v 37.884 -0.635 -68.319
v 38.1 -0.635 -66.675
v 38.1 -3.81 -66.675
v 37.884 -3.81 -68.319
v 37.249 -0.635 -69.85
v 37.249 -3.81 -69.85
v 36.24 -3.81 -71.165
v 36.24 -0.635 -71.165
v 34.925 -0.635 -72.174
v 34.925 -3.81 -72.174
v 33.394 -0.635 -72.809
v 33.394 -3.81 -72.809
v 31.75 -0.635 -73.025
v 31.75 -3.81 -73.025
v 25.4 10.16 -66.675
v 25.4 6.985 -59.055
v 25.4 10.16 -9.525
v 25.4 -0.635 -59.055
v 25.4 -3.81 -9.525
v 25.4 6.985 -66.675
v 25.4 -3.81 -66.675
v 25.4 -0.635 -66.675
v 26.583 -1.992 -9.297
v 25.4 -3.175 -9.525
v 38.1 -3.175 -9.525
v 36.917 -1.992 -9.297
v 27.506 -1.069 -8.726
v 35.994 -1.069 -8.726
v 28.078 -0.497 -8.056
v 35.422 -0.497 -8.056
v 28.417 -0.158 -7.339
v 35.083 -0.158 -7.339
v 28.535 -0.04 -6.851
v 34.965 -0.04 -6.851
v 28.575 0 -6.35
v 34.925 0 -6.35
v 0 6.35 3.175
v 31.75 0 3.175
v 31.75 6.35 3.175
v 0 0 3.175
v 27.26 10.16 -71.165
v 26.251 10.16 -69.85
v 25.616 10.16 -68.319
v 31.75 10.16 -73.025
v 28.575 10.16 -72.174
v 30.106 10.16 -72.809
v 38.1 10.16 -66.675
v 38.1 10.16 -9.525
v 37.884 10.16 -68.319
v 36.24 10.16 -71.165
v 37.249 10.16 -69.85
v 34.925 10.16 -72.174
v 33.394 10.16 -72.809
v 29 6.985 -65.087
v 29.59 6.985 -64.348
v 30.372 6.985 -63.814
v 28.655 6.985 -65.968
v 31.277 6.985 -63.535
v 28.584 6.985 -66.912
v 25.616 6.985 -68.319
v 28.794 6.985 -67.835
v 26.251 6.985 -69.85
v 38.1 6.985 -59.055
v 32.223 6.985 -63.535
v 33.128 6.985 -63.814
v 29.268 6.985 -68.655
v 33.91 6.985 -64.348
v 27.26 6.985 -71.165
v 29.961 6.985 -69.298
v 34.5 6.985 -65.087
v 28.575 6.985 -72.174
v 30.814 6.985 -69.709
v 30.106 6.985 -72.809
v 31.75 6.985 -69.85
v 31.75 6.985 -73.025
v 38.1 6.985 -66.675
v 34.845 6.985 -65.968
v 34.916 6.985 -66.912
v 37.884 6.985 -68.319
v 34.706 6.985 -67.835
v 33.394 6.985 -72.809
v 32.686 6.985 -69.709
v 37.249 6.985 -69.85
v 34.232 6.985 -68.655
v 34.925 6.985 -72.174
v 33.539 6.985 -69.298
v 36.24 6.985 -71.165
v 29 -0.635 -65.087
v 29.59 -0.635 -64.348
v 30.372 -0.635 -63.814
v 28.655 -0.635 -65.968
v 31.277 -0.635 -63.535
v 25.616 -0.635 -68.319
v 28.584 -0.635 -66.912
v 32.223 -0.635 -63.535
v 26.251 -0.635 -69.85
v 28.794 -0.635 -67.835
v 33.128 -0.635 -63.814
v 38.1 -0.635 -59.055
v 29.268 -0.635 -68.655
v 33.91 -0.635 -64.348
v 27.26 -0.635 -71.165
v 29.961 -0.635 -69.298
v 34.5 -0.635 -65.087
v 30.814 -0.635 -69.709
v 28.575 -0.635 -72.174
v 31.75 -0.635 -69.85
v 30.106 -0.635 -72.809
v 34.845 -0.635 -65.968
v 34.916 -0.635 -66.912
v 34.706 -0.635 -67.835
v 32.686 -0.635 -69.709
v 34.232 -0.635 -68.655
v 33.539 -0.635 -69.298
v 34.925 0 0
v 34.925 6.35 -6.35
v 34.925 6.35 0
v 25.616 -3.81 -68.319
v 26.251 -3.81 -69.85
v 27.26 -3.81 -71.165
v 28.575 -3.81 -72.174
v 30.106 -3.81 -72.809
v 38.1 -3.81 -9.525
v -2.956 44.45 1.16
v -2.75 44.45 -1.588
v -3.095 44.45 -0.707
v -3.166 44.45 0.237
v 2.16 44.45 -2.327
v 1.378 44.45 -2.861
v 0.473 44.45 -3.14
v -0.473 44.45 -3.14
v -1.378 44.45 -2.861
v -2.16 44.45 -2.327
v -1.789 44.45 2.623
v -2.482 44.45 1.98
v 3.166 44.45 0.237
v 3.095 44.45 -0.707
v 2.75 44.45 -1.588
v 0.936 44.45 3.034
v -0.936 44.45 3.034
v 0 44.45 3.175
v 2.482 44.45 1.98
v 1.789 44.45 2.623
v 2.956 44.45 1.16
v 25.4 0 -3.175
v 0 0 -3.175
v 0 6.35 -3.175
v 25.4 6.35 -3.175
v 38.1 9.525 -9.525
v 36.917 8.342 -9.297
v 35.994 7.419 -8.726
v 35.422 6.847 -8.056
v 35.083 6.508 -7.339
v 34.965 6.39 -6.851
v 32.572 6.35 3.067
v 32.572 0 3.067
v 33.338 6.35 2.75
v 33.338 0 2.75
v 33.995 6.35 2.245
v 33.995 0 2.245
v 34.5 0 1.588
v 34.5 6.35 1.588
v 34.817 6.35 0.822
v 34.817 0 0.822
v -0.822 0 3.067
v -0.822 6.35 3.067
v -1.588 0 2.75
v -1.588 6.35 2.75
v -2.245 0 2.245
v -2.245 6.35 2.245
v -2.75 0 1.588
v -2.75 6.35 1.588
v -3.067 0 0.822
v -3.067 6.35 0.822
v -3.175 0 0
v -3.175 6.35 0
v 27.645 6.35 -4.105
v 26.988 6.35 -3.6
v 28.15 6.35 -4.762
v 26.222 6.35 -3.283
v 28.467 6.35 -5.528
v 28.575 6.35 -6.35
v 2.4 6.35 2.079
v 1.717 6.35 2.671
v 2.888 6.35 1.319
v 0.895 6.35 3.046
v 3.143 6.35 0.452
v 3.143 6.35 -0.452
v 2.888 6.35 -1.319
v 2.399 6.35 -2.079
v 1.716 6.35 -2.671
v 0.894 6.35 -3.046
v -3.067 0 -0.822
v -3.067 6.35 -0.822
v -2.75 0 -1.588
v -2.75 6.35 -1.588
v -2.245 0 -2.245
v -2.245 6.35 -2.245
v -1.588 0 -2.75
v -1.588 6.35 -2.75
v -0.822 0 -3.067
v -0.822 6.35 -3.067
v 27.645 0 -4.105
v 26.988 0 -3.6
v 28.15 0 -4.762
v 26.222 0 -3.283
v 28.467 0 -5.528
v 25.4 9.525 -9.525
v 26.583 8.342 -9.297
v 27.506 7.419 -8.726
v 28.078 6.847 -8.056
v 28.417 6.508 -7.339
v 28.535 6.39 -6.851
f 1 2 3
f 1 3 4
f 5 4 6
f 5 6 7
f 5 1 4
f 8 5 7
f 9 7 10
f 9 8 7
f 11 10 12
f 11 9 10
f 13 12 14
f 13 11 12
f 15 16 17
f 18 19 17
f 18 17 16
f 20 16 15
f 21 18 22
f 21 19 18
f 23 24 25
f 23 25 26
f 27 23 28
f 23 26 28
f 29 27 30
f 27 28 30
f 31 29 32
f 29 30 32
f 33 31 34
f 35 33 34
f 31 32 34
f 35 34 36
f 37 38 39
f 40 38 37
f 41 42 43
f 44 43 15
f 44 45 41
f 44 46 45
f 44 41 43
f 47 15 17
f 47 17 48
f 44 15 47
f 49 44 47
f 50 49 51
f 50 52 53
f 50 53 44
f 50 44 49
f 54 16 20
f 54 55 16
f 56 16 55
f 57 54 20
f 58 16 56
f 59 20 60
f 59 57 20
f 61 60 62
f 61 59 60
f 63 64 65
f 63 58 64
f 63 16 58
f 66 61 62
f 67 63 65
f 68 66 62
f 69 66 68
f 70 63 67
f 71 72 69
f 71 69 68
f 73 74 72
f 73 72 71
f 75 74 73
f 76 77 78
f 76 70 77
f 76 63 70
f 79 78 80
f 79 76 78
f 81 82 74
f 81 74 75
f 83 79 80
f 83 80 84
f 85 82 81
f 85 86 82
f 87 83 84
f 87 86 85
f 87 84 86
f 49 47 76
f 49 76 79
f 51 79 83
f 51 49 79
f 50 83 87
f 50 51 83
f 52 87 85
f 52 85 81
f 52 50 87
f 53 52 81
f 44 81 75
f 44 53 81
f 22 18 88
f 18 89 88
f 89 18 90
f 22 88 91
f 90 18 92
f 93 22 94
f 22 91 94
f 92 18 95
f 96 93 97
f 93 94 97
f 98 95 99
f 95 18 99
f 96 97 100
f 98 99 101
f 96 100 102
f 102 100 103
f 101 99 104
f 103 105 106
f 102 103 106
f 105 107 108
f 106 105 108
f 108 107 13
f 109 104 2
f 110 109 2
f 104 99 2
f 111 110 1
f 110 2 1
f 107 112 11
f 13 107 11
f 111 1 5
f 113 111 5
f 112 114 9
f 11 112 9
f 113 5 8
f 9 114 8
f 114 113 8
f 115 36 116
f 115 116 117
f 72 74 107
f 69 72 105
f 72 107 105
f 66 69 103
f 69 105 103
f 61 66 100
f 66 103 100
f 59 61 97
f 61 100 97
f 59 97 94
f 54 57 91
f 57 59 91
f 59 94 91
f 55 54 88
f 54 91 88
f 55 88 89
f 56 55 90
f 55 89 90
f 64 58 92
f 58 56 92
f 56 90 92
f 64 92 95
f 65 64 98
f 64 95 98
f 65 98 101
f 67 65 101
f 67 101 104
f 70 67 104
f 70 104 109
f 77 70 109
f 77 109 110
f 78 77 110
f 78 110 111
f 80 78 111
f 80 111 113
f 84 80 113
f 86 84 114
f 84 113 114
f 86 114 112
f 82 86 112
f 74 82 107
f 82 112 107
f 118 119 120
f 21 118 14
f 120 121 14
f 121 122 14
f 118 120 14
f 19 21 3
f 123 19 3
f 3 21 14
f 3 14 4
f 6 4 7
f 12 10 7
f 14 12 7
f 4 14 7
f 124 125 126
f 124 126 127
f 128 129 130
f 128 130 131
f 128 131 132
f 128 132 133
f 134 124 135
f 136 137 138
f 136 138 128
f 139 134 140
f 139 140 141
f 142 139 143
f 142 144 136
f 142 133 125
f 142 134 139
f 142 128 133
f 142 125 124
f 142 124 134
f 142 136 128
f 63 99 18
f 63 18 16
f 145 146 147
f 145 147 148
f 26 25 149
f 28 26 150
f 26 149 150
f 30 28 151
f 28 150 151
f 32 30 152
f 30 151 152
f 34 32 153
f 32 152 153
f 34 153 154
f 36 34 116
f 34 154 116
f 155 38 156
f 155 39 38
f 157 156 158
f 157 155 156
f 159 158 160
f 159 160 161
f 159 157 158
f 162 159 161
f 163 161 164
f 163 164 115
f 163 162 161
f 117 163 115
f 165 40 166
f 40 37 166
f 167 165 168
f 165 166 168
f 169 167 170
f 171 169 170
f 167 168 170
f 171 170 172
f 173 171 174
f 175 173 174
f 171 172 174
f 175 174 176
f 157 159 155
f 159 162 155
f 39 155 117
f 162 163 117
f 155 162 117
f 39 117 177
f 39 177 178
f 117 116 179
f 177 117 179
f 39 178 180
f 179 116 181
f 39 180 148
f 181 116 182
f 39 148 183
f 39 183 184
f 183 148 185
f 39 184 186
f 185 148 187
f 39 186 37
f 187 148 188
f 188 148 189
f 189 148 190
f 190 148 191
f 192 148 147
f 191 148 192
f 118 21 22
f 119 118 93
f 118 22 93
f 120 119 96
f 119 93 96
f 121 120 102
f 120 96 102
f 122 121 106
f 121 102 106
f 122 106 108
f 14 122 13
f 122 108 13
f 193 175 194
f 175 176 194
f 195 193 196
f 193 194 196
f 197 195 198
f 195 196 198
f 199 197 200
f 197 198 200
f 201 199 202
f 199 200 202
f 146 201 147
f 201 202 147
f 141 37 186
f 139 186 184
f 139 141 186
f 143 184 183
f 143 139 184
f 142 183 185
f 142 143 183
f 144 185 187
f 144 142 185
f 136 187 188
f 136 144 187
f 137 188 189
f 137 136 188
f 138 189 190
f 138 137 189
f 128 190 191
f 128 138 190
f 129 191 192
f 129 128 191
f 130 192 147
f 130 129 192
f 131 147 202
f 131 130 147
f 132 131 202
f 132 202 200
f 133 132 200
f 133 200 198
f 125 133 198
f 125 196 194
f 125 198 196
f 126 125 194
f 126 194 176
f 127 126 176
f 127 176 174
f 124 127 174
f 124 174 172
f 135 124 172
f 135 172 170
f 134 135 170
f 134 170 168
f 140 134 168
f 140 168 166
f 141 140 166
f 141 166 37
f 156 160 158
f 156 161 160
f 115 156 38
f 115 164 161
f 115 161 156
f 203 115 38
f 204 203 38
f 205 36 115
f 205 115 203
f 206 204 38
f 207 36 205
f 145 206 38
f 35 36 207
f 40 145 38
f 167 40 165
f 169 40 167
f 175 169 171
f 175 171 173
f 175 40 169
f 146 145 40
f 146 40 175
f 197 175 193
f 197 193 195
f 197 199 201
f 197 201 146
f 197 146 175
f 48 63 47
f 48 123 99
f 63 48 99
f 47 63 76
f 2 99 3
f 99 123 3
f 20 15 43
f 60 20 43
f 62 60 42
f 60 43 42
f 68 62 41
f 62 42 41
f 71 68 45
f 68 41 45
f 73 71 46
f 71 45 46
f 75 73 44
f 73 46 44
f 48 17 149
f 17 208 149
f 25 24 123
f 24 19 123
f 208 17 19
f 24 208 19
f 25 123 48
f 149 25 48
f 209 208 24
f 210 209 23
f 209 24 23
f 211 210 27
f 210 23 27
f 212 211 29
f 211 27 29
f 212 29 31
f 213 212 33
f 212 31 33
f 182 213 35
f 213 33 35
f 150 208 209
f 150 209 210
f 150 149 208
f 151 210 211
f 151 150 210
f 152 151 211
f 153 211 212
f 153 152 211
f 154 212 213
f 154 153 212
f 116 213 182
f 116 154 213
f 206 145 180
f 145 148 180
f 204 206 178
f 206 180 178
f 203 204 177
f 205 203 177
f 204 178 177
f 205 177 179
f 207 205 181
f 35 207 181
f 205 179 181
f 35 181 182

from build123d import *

# Parameters (mm, degrees)
SKETCH1_R                = 3.175
BOSS_EXTRUDE1_DEPTH      = 38.1
BOSS_EXTRUDE2_DEPTH      = 6.35
FILLET1_R                = 3.175
BOSS_EXTRUDE3_DEPTH      = 3.81
BOSS_EXTRUDE3_DEPTH_BACK = 10.16
SKETCH3_W                = 12.7
SKETCH3_H                = 63.5
FILLET2_R                = 3.175
FILLET3_R                = 6.35
CUT_EXTRUDE1_REACH       = 94.13
SKETCH4_W                = 15.24
SKETCH4_H                = 7.62
SKETCH5_R                = 3.175
BOSS_EXTRUDE4_DEPTH      = 10.16
BOSS_EXTRUDE5_START      = 38.1
SKETCH6_R                = 3.175
BOSS_EXTRUDE5_DEPTH      = 38.1
SKETCH7_R                = 3.175
CUT_EXTRUDE2_DEPTH       = 38.1


with BuildPart() as part:
    # Sketch1 → Boss-Extrude1 (new body)
    with BuildSketch(Plane(origin=(0, 0, 0), x_dir=(1, 0, 0), z_dir=(0, 1, 0))):
        with Locations(Location((0, 0, 0), (0, 0, 270))):
            Circle(SKETCH1_R)
    extrude(amount=-BOSS_EXTRUDE1_DEPTH)

    # Sketch2 → Boss-Extrude2 (add)
    with BuildSketch(Plane(origin=(0, 0, 0), x_dir=(1, 0, 0), z_dir=(0, 1, 0))):
        Polygon((34.925, -3.175), (-3.175, -3.175), (-3.175, 3.175), (28.575, 3.175), (28.575, 60.325), (34.925, 60.325), align=None)
    extrude(amount=BOSS_EXTRUDE2_DEPTH)

    # Fillet1
    fillet1_edges = [part.edges().sort_by_distance(p)[0] for p in [
        (28.575, 3.175, -3.175),
        (34.925, 3.175, 3.175),
        (-3.175, 3.175, -3.175),
        (-3.175, 3.175, 3.175),
    ]]
    fillet(fillet1_edges, radius=FILLET1_R - 0.0001)  # a hair under: the kernel refuses the full size

    # Sketch3 → Boss-Extrude3 (add, two sides: drawn at the far end of the back side and taken through both)
    with BuildSketch(Plane(origin=(0, 6.35, 0), x_dir=(1, 0, 0), z_dir=(0, 1, 0)).offset(-BOSS_EXTRUDE3_DEPTH_BACK)):
        with Locations((31.75, 41.275)):
            Rectangle(SKETCH3_W, SKETCH3_H)
    extrude(amount=BOSS_EXTRUDE3_DEPTH + BOSS_EXTRUDE3_DEPTH_BACK)

    # Fillet2
    fillet2_edges = [part.edges().sort_by_distance(p)[0] for p in [
        (28.575, 3.175, -9.525),
        (31.75, 0, -9.525),
        (34.925, 3.175, -9.525),
        (31.75, 6.35, -9.525),
    ]]
    fillet(fillet2_edges, radius=FILLET2_R - 0.0001)  # a hair under: the kernel refuses the full size

    # Fillet3
    fillet3_edges = [part.edges().sort_by_distance(p)[0] for p in [
        (25.4, 3.175, -73.025),
        (38.1, 3.175, -73.025),
    ]]
    fillet(fillet3_edges, radius=FILLET3_R - 0.0001)  # a hair under: the kernel refuses the full size

    # Sketch4 → Cut-Extrude1 (cut, up to next)
    with BuildSketch(Plane(origin=(38.1, 0, 0), x_dir=(0, 0, -1), z_dir=(1, 0, 0)), mode=Mode.PRIVATE) as cut_extrude1_sk1:
        with Locations((66.675, 3.175)):
            Rectangle(SKETCH4_W, SKETCH4_H)
    cut_extrude1_tool1 = extrude(cut_extrude1_sk1.sketch, amount=-CUT_EXTRUDE1_REACH, mode=Mode.PRIVATE) & part.part
    add(cut_extrude1_tool1.solids().sort_by_distance((38.1, 3.175, -66.675))[0], mode=Mode.SUBTRACT)

    # Sketch5 → Boss-Extrude4 (add)
    with BuildSketch(Plane(origin=(0, -0.635, 0), x_dir=(1, 0, 0), z_dir=(0, 1, 0))):
        with Locations(Location((31.75, 66.675, 0), (0, 0, 90))):
            Circle(SKETCH5_R)
    extrude(amount=BOSS_EXTRUDE4_DEPTH)

    # Sketch6 → Boss-Extrude5 (add)
    with BuildSketch(Plane(origin=(0, 6.35, 0), x_dir=(1, 0, 0), z_dir=(0, 1, 0)).offset(BOSS_EXTRUDE5_START)):
        with Locations(Location((0, 0, 0), (0, 0, 270))):
            Circle(SKETCH6_R)
    extrude(amount=-BOSS_EXTRUDE5_DEPTH)

    # Sketch7 → Cut-Extrude2 (cut)
    with BuildSketch(Plane.XZ):
        with Locations(Location((0, 0, 0), (0, 0, 90))):
            Circle(SKETCH7_R)
    extrude(amount=CUT_EXTRUDE2_DEPTH, mode=Mode.SUBTRACT)


with BuildPart() as cut_extrude2_kept_piece:
    # of the separate pieces the step leaves, the one the design keeps (cut_extrude2_pieces_kept)
    add(part.part.solids().sort_by_distance((25.4, 10.16, -66.6751))[0])


solid = cut_extrude2_kept_piece.part
